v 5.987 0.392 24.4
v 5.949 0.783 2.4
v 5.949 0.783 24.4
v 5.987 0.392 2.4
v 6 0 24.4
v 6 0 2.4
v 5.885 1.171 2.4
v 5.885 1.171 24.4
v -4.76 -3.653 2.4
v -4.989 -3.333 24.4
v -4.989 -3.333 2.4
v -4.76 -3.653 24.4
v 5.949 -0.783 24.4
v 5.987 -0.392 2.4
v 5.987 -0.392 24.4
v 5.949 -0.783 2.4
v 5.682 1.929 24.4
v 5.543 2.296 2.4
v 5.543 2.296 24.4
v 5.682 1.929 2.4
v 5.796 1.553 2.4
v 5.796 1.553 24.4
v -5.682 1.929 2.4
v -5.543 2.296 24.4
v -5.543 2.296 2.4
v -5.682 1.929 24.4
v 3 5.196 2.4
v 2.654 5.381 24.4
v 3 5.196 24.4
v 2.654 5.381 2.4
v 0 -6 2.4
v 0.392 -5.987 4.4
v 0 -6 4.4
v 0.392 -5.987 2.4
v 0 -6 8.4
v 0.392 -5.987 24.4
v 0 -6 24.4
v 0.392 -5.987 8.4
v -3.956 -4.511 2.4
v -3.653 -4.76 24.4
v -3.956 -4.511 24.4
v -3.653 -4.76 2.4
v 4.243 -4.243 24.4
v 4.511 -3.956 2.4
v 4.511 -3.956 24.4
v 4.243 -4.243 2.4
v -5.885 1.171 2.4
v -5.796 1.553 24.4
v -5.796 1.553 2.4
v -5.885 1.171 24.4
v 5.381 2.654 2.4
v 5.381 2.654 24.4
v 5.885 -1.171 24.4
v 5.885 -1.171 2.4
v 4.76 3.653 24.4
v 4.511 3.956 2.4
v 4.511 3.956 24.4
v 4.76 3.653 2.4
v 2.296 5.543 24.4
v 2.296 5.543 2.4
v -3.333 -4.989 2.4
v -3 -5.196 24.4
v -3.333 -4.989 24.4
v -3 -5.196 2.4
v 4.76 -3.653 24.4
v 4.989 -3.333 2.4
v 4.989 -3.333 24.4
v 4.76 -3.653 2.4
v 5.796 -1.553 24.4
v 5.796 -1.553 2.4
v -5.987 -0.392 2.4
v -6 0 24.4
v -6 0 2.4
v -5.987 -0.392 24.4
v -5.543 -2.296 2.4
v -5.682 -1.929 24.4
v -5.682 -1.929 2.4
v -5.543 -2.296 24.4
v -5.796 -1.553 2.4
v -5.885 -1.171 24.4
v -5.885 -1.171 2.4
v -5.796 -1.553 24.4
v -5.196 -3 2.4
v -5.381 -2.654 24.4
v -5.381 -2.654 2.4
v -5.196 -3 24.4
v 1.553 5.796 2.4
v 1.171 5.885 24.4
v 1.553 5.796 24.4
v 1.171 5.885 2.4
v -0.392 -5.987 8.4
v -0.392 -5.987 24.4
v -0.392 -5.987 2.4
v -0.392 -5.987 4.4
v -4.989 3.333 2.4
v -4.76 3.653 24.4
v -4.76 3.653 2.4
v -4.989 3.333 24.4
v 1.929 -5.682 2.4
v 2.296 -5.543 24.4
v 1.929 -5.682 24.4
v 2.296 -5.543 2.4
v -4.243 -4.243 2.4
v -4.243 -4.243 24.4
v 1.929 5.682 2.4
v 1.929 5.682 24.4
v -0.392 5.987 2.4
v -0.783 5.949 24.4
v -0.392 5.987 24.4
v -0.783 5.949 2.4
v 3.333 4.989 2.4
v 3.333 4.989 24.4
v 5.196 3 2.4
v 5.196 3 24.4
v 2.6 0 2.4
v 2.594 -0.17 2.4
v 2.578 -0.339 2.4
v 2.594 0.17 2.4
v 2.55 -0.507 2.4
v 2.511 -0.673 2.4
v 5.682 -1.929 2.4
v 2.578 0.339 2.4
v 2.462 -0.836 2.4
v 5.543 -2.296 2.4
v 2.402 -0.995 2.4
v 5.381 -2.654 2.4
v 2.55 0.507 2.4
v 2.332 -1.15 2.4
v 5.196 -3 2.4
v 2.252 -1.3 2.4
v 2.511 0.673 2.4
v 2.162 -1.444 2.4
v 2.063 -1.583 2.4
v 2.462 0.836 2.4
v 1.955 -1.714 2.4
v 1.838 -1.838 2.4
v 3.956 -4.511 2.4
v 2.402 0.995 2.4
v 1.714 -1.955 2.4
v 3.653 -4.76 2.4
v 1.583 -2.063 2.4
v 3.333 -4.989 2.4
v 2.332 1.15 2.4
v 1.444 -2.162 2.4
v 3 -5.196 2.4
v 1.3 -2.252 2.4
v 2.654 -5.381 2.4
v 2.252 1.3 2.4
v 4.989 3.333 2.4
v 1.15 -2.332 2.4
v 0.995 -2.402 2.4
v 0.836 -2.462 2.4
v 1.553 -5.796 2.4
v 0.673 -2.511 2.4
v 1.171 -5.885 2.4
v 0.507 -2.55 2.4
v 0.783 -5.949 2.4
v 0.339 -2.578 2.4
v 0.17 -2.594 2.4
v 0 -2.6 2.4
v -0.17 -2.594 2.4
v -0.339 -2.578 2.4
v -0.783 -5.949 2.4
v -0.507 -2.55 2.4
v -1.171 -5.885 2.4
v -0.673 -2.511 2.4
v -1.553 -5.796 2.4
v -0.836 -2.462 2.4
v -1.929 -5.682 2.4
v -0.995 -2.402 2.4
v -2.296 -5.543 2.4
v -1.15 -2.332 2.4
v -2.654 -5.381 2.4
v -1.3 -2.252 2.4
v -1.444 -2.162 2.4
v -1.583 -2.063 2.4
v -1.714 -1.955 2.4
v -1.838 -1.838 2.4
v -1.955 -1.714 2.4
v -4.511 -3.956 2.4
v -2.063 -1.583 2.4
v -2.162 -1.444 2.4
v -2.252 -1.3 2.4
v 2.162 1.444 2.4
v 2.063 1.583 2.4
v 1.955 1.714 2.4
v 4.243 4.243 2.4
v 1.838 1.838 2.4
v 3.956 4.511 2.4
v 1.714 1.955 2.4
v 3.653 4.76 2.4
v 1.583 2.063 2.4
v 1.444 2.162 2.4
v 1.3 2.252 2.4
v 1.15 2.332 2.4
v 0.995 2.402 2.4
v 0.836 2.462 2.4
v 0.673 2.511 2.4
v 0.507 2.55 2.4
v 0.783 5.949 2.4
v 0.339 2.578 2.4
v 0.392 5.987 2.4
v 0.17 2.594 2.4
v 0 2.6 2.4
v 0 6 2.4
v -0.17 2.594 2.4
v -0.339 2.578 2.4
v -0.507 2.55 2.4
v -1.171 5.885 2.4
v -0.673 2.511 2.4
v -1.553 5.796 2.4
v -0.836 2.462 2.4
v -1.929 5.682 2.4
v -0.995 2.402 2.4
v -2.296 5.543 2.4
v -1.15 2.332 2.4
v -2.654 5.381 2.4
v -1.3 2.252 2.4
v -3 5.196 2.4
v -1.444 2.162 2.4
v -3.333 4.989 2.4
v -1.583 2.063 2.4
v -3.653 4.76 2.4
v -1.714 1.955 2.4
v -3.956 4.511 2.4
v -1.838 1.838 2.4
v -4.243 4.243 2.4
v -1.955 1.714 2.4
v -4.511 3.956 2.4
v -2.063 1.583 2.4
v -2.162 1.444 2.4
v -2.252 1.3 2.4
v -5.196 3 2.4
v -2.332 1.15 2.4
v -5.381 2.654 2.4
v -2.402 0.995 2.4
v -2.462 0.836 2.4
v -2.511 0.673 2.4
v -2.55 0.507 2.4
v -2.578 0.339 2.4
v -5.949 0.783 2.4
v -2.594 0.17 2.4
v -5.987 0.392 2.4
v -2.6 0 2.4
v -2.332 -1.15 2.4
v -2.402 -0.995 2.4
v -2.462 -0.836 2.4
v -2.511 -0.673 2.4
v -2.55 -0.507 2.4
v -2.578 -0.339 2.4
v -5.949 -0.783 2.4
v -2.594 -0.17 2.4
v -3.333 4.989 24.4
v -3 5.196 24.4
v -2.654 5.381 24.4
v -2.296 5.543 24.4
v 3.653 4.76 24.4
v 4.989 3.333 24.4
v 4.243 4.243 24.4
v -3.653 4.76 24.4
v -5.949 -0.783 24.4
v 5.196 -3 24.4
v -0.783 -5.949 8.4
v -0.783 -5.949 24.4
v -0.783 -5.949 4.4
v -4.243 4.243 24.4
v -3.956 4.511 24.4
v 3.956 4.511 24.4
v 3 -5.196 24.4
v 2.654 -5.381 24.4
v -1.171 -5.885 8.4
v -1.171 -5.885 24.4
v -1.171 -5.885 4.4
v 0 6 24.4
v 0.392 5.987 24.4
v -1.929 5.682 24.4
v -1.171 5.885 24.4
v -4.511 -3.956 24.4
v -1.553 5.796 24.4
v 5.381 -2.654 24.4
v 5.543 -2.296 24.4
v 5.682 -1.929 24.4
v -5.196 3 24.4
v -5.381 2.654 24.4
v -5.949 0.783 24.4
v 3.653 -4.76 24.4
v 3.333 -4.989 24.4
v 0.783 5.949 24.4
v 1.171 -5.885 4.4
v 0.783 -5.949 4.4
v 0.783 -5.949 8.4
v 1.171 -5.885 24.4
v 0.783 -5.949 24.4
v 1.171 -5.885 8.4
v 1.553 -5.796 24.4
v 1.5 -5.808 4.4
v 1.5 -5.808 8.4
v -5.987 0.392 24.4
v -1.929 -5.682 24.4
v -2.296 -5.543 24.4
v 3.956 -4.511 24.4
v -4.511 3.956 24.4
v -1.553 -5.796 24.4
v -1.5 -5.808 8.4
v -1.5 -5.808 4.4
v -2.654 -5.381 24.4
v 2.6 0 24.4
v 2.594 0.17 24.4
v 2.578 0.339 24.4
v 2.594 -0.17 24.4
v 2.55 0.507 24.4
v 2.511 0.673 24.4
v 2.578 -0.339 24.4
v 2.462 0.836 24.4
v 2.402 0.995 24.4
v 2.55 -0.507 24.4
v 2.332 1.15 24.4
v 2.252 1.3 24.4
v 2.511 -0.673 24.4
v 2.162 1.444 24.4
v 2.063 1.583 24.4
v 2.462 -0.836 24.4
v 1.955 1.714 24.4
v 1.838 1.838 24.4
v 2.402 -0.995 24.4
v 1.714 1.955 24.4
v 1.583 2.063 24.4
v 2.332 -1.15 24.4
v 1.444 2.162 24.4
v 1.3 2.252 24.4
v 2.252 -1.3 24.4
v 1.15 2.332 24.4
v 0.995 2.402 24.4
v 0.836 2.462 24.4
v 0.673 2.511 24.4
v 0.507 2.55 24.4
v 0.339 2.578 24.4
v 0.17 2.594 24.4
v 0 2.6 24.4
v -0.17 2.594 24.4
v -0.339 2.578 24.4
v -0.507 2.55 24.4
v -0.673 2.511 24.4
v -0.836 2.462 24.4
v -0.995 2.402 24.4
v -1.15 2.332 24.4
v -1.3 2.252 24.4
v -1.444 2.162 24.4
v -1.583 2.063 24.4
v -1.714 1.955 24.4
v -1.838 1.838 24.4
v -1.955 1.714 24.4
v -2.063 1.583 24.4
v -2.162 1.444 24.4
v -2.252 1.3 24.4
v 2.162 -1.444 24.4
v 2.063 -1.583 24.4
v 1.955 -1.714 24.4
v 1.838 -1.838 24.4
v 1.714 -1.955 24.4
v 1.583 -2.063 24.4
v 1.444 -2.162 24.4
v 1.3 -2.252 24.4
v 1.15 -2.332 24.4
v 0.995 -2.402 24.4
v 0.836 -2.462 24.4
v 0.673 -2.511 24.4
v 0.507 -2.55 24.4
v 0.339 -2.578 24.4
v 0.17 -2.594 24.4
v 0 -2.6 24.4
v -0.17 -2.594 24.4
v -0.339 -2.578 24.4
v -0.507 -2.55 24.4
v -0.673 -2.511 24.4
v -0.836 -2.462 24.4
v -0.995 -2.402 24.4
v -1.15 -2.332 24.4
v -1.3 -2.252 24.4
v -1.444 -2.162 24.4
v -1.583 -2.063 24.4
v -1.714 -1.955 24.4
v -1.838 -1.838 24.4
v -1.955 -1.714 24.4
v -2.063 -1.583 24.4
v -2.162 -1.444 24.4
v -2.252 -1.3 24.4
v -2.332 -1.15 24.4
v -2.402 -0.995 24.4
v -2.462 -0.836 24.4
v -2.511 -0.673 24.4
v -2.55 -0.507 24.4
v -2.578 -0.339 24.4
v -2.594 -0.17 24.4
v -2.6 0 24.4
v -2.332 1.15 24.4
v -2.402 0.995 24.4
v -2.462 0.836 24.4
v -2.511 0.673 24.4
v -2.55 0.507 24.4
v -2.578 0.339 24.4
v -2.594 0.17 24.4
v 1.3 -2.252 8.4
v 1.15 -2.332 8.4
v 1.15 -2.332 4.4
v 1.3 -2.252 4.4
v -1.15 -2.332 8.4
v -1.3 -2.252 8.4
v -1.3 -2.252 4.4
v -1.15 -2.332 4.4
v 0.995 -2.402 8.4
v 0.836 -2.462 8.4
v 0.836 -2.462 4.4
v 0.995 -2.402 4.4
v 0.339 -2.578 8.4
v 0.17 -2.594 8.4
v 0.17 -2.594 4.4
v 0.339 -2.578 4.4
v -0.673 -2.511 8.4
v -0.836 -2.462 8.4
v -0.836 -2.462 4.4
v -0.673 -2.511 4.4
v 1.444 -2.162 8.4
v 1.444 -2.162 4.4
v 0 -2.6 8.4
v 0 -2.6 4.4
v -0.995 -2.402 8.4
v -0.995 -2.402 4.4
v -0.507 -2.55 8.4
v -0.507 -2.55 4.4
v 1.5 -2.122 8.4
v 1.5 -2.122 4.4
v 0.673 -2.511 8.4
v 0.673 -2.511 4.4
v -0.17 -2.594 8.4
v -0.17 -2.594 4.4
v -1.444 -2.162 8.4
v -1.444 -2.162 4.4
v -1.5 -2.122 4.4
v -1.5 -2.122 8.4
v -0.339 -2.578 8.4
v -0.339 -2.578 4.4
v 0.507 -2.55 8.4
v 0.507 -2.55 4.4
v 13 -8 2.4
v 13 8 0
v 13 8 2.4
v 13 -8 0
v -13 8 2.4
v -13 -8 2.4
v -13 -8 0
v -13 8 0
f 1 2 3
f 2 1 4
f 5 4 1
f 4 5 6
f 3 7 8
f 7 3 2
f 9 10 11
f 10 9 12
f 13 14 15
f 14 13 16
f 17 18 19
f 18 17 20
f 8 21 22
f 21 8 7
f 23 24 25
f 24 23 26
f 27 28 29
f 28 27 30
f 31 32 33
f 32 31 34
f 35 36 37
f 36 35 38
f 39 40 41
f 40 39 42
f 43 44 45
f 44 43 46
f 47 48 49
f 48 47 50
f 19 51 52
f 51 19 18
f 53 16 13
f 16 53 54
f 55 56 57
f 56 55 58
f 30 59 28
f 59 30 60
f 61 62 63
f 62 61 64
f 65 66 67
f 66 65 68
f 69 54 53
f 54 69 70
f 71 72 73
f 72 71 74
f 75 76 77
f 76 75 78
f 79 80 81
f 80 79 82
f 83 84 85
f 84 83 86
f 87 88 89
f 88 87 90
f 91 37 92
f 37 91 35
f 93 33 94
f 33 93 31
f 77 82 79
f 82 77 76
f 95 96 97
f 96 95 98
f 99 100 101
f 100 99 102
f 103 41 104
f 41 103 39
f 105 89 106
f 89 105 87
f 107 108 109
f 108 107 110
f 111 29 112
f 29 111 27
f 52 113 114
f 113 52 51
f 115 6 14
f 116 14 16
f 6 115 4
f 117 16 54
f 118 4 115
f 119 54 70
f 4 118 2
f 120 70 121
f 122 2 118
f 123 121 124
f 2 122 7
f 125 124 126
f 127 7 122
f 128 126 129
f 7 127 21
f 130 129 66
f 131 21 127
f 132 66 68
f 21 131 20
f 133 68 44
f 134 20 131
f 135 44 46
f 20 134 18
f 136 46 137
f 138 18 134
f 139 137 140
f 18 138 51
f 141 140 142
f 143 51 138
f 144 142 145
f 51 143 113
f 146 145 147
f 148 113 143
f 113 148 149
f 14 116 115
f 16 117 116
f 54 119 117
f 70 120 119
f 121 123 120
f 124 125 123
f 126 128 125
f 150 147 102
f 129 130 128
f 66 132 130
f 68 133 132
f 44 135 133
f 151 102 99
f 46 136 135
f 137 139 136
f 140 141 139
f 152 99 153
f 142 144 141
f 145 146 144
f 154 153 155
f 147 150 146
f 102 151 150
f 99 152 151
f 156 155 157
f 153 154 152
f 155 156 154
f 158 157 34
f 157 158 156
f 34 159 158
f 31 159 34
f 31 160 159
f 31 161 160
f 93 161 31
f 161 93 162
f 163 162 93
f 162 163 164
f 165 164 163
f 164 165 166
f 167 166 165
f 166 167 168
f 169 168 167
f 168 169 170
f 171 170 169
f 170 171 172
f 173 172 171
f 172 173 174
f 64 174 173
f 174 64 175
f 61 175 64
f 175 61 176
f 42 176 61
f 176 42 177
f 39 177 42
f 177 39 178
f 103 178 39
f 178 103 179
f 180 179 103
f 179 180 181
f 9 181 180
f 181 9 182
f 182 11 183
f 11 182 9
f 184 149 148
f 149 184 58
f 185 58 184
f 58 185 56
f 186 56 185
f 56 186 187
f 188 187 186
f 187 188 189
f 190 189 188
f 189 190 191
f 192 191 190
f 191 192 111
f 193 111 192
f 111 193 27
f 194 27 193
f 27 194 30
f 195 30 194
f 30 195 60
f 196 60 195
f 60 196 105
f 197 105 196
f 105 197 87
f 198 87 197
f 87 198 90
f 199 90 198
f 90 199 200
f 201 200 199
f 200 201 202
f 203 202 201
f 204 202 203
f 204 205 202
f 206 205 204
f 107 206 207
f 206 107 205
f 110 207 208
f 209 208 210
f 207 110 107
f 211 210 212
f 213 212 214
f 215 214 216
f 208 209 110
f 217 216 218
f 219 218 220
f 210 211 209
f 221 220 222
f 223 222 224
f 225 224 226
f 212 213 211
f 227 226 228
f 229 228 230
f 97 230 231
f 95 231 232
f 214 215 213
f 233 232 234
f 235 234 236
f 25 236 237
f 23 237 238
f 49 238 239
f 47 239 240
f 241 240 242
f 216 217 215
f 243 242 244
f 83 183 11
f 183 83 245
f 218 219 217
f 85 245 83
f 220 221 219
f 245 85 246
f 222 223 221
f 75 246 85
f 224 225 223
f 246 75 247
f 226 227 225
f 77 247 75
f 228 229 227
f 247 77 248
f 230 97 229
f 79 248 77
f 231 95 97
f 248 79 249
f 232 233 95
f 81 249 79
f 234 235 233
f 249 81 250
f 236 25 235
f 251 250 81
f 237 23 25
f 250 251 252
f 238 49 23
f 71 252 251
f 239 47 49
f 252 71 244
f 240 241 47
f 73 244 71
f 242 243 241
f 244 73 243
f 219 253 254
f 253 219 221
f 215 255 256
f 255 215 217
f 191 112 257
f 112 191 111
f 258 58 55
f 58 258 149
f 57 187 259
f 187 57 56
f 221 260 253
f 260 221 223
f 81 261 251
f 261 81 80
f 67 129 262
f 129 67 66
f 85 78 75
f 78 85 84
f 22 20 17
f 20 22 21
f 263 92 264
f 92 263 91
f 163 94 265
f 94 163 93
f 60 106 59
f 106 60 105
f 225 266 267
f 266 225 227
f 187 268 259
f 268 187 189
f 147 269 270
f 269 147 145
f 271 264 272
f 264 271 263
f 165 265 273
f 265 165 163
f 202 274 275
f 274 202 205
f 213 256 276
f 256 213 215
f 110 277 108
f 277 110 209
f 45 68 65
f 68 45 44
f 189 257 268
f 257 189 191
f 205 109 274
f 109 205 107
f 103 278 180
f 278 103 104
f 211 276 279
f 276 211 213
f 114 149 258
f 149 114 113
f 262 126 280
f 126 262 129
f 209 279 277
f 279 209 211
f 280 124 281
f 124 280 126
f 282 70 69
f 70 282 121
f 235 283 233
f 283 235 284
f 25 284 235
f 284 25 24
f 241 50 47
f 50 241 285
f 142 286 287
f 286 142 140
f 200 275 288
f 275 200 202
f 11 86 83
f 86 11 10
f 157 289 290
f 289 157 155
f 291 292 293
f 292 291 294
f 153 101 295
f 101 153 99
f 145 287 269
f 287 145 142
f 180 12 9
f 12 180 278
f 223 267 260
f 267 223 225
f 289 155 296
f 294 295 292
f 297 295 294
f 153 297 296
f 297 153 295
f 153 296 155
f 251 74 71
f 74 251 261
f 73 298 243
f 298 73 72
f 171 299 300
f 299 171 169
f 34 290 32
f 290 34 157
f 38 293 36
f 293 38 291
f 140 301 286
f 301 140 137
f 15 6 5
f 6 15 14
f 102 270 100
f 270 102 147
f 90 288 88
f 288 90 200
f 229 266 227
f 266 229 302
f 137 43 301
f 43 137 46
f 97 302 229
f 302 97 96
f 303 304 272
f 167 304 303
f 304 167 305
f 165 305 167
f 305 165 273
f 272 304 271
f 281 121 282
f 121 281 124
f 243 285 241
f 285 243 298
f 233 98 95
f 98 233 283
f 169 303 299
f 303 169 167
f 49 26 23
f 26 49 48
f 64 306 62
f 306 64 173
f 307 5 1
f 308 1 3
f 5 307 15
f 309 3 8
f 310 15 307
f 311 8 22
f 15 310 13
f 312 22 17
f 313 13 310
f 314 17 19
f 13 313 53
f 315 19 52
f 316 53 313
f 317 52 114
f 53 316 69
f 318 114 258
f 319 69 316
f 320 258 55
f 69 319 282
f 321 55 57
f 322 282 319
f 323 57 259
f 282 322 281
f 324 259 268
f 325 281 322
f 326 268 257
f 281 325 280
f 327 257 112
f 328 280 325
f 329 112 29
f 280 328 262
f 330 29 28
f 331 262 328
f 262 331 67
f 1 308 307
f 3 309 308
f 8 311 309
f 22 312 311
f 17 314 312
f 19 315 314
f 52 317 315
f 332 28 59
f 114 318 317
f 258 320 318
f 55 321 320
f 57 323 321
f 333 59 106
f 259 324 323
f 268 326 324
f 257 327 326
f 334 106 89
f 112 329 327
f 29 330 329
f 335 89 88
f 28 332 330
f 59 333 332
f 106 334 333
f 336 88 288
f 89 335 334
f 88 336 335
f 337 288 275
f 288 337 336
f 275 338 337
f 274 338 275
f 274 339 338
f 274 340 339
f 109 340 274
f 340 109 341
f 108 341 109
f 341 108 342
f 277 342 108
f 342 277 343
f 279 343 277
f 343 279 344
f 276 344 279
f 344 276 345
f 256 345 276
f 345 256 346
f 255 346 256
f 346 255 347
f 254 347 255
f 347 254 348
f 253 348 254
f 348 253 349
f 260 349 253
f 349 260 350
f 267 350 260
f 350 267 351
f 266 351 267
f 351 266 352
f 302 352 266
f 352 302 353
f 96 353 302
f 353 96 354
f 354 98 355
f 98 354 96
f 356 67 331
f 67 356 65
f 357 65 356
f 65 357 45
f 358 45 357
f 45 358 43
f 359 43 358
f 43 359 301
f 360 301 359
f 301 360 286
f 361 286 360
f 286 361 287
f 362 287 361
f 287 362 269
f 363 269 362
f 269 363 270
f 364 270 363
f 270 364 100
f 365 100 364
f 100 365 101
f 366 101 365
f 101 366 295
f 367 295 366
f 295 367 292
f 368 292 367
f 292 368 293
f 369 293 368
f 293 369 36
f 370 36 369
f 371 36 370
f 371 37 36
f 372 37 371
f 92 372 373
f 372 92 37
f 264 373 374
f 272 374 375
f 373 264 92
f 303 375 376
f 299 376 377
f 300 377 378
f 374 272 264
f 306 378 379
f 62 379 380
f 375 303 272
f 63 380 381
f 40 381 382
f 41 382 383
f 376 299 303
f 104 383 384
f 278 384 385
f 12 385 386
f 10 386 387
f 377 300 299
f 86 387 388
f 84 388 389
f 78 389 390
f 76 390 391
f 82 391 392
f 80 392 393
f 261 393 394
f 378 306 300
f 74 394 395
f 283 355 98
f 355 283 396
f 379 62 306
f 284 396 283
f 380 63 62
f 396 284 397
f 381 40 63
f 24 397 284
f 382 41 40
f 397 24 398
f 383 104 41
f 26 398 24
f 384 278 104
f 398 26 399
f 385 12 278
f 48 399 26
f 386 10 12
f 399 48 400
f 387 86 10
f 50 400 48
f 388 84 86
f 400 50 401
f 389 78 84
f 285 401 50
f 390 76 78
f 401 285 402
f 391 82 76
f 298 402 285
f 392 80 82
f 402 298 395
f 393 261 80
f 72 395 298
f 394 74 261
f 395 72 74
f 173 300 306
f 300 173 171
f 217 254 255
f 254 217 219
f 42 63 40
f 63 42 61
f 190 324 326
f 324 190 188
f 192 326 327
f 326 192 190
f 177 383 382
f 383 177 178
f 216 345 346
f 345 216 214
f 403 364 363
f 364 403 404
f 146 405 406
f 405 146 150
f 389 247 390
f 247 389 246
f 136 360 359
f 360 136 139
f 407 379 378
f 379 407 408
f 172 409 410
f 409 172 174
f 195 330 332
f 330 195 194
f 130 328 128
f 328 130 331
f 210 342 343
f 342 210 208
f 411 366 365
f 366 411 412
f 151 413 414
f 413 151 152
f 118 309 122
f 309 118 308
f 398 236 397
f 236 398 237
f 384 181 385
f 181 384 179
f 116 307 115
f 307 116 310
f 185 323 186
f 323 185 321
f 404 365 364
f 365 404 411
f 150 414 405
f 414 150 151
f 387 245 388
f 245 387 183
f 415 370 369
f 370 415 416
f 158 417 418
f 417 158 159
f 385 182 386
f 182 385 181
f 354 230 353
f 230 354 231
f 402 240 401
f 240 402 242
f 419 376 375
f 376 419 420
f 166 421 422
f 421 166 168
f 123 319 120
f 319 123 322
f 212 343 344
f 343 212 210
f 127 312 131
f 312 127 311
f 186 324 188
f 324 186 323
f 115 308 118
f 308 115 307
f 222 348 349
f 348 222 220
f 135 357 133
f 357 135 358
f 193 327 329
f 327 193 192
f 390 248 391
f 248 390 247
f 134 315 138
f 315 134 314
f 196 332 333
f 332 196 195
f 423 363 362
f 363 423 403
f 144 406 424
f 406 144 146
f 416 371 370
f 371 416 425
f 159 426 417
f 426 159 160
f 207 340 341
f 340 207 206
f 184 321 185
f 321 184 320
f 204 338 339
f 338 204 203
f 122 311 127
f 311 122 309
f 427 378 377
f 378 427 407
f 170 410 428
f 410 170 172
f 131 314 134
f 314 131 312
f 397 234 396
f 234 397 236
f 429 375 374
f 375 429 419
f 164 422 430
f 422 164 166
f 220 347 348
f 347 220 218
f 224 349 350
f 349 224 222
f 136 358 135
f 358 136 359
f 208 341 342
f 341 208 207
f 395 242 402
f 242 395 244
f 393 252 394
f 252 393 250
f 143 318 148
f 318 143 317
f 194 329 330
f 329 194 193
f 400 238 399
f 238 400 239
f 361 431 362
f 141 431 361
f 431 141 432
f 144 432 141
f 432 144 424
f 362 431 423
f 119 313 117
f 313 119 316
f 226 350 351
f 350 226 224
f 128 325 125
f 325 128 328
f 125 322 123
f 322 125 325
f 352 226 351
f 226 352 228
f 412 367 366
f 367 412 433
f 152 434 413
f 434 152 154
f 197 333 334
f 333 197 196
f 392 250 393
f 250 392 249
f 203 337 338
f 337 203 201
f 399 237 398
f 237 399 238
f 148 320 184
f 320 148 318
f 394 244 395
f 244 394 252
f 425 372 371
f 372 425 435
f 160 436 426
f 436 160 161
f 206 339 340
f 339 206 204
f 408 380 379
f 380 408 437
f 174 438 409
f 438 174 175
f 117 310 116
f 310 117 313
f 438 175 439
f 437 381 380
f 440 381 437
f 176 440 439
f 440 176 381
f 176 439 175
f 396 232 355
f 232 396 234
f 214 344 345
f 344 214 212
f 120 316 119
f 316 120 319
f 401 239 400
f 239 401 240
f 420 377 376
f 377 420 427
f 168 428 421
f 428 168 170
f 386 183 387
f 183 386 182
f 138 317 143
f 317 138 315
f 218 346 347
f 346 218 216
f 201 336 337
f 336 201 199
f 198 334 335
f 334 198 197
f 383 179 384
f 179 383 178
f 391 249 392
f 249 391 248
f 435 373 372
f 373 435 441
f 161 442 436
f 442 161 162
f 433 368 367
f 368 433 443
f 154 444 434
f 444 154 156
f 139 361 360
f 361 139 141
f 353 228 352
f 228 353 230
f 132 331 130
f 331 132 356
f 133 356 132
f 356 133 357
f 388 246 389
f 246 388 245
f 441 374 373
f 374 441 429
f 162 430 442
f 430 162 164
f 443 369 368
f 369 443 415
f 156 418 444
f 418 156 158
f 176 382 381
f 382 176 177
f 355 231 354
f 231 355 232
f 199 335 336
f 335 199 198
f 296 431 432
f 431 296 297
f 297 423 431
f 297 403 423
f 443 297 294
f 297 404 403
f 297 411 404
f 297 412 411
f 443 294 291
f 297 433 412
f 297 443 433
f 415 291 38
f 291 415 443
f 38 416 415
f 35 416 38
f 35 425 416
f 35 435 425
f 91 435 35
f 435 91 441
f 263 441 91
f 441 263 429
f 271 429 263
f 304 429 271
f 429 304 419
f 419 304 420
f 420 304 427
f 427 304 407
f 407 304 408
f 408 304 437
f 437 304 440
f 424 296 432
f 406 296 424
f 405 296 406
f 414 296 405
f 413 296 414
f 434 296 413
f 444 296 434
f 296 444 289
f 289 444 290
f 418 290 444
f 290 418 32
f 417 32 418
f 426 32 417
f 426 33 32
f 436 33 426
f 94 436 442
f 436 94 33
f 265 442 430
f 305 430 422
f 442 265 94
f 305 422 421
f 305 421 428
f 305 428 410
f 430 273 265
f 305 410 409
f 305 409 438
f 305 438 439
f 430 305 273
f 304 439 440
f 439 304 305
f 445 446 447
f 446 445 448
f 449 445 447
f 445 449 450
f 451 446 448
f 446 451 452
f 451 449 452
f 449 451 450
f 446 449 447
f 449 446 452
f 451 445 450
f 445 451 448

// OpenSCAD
// ESPHome Boiler Monitor - Sensor Holder
// For BPW40/BPW77-style phototransistor in a light-shield tube.
// Print in black PETG/PLA if possible.
// Units: mm

$fn = 96;

tube_outer_d = 12;
tube_inner_d = 5.2;
tube_length  = 22;

pad_w = 26;
pad_h = 16;
pad_t = 2.4;

cable_slot_w = 3.0;
cable_slot_h = 4.0;

module sensor_tube() {
  difference() {
    cylinder(h=tube_length, d=tube_outer_d);
    translate([0,0,-0.5])
      cylinder(h=tube_length+1, d=tube_inner_d);

    // rear cable slot
    translate([-cable_slot_w/2, -tube_outer_d/2-0.2, 2])
      cube([cable_slot_w, tube_outer_d/2+1, cable_slot_h]);
  }
}

module mounting_pad() {
  translate([-pad_w/2, -pad_h/2, 0])
    cube([pad_w, pad_h, pad_t]);
}

union() {
  mounting_pad();
  translate([0,0,pad_t])
    sensor_tube();
}
